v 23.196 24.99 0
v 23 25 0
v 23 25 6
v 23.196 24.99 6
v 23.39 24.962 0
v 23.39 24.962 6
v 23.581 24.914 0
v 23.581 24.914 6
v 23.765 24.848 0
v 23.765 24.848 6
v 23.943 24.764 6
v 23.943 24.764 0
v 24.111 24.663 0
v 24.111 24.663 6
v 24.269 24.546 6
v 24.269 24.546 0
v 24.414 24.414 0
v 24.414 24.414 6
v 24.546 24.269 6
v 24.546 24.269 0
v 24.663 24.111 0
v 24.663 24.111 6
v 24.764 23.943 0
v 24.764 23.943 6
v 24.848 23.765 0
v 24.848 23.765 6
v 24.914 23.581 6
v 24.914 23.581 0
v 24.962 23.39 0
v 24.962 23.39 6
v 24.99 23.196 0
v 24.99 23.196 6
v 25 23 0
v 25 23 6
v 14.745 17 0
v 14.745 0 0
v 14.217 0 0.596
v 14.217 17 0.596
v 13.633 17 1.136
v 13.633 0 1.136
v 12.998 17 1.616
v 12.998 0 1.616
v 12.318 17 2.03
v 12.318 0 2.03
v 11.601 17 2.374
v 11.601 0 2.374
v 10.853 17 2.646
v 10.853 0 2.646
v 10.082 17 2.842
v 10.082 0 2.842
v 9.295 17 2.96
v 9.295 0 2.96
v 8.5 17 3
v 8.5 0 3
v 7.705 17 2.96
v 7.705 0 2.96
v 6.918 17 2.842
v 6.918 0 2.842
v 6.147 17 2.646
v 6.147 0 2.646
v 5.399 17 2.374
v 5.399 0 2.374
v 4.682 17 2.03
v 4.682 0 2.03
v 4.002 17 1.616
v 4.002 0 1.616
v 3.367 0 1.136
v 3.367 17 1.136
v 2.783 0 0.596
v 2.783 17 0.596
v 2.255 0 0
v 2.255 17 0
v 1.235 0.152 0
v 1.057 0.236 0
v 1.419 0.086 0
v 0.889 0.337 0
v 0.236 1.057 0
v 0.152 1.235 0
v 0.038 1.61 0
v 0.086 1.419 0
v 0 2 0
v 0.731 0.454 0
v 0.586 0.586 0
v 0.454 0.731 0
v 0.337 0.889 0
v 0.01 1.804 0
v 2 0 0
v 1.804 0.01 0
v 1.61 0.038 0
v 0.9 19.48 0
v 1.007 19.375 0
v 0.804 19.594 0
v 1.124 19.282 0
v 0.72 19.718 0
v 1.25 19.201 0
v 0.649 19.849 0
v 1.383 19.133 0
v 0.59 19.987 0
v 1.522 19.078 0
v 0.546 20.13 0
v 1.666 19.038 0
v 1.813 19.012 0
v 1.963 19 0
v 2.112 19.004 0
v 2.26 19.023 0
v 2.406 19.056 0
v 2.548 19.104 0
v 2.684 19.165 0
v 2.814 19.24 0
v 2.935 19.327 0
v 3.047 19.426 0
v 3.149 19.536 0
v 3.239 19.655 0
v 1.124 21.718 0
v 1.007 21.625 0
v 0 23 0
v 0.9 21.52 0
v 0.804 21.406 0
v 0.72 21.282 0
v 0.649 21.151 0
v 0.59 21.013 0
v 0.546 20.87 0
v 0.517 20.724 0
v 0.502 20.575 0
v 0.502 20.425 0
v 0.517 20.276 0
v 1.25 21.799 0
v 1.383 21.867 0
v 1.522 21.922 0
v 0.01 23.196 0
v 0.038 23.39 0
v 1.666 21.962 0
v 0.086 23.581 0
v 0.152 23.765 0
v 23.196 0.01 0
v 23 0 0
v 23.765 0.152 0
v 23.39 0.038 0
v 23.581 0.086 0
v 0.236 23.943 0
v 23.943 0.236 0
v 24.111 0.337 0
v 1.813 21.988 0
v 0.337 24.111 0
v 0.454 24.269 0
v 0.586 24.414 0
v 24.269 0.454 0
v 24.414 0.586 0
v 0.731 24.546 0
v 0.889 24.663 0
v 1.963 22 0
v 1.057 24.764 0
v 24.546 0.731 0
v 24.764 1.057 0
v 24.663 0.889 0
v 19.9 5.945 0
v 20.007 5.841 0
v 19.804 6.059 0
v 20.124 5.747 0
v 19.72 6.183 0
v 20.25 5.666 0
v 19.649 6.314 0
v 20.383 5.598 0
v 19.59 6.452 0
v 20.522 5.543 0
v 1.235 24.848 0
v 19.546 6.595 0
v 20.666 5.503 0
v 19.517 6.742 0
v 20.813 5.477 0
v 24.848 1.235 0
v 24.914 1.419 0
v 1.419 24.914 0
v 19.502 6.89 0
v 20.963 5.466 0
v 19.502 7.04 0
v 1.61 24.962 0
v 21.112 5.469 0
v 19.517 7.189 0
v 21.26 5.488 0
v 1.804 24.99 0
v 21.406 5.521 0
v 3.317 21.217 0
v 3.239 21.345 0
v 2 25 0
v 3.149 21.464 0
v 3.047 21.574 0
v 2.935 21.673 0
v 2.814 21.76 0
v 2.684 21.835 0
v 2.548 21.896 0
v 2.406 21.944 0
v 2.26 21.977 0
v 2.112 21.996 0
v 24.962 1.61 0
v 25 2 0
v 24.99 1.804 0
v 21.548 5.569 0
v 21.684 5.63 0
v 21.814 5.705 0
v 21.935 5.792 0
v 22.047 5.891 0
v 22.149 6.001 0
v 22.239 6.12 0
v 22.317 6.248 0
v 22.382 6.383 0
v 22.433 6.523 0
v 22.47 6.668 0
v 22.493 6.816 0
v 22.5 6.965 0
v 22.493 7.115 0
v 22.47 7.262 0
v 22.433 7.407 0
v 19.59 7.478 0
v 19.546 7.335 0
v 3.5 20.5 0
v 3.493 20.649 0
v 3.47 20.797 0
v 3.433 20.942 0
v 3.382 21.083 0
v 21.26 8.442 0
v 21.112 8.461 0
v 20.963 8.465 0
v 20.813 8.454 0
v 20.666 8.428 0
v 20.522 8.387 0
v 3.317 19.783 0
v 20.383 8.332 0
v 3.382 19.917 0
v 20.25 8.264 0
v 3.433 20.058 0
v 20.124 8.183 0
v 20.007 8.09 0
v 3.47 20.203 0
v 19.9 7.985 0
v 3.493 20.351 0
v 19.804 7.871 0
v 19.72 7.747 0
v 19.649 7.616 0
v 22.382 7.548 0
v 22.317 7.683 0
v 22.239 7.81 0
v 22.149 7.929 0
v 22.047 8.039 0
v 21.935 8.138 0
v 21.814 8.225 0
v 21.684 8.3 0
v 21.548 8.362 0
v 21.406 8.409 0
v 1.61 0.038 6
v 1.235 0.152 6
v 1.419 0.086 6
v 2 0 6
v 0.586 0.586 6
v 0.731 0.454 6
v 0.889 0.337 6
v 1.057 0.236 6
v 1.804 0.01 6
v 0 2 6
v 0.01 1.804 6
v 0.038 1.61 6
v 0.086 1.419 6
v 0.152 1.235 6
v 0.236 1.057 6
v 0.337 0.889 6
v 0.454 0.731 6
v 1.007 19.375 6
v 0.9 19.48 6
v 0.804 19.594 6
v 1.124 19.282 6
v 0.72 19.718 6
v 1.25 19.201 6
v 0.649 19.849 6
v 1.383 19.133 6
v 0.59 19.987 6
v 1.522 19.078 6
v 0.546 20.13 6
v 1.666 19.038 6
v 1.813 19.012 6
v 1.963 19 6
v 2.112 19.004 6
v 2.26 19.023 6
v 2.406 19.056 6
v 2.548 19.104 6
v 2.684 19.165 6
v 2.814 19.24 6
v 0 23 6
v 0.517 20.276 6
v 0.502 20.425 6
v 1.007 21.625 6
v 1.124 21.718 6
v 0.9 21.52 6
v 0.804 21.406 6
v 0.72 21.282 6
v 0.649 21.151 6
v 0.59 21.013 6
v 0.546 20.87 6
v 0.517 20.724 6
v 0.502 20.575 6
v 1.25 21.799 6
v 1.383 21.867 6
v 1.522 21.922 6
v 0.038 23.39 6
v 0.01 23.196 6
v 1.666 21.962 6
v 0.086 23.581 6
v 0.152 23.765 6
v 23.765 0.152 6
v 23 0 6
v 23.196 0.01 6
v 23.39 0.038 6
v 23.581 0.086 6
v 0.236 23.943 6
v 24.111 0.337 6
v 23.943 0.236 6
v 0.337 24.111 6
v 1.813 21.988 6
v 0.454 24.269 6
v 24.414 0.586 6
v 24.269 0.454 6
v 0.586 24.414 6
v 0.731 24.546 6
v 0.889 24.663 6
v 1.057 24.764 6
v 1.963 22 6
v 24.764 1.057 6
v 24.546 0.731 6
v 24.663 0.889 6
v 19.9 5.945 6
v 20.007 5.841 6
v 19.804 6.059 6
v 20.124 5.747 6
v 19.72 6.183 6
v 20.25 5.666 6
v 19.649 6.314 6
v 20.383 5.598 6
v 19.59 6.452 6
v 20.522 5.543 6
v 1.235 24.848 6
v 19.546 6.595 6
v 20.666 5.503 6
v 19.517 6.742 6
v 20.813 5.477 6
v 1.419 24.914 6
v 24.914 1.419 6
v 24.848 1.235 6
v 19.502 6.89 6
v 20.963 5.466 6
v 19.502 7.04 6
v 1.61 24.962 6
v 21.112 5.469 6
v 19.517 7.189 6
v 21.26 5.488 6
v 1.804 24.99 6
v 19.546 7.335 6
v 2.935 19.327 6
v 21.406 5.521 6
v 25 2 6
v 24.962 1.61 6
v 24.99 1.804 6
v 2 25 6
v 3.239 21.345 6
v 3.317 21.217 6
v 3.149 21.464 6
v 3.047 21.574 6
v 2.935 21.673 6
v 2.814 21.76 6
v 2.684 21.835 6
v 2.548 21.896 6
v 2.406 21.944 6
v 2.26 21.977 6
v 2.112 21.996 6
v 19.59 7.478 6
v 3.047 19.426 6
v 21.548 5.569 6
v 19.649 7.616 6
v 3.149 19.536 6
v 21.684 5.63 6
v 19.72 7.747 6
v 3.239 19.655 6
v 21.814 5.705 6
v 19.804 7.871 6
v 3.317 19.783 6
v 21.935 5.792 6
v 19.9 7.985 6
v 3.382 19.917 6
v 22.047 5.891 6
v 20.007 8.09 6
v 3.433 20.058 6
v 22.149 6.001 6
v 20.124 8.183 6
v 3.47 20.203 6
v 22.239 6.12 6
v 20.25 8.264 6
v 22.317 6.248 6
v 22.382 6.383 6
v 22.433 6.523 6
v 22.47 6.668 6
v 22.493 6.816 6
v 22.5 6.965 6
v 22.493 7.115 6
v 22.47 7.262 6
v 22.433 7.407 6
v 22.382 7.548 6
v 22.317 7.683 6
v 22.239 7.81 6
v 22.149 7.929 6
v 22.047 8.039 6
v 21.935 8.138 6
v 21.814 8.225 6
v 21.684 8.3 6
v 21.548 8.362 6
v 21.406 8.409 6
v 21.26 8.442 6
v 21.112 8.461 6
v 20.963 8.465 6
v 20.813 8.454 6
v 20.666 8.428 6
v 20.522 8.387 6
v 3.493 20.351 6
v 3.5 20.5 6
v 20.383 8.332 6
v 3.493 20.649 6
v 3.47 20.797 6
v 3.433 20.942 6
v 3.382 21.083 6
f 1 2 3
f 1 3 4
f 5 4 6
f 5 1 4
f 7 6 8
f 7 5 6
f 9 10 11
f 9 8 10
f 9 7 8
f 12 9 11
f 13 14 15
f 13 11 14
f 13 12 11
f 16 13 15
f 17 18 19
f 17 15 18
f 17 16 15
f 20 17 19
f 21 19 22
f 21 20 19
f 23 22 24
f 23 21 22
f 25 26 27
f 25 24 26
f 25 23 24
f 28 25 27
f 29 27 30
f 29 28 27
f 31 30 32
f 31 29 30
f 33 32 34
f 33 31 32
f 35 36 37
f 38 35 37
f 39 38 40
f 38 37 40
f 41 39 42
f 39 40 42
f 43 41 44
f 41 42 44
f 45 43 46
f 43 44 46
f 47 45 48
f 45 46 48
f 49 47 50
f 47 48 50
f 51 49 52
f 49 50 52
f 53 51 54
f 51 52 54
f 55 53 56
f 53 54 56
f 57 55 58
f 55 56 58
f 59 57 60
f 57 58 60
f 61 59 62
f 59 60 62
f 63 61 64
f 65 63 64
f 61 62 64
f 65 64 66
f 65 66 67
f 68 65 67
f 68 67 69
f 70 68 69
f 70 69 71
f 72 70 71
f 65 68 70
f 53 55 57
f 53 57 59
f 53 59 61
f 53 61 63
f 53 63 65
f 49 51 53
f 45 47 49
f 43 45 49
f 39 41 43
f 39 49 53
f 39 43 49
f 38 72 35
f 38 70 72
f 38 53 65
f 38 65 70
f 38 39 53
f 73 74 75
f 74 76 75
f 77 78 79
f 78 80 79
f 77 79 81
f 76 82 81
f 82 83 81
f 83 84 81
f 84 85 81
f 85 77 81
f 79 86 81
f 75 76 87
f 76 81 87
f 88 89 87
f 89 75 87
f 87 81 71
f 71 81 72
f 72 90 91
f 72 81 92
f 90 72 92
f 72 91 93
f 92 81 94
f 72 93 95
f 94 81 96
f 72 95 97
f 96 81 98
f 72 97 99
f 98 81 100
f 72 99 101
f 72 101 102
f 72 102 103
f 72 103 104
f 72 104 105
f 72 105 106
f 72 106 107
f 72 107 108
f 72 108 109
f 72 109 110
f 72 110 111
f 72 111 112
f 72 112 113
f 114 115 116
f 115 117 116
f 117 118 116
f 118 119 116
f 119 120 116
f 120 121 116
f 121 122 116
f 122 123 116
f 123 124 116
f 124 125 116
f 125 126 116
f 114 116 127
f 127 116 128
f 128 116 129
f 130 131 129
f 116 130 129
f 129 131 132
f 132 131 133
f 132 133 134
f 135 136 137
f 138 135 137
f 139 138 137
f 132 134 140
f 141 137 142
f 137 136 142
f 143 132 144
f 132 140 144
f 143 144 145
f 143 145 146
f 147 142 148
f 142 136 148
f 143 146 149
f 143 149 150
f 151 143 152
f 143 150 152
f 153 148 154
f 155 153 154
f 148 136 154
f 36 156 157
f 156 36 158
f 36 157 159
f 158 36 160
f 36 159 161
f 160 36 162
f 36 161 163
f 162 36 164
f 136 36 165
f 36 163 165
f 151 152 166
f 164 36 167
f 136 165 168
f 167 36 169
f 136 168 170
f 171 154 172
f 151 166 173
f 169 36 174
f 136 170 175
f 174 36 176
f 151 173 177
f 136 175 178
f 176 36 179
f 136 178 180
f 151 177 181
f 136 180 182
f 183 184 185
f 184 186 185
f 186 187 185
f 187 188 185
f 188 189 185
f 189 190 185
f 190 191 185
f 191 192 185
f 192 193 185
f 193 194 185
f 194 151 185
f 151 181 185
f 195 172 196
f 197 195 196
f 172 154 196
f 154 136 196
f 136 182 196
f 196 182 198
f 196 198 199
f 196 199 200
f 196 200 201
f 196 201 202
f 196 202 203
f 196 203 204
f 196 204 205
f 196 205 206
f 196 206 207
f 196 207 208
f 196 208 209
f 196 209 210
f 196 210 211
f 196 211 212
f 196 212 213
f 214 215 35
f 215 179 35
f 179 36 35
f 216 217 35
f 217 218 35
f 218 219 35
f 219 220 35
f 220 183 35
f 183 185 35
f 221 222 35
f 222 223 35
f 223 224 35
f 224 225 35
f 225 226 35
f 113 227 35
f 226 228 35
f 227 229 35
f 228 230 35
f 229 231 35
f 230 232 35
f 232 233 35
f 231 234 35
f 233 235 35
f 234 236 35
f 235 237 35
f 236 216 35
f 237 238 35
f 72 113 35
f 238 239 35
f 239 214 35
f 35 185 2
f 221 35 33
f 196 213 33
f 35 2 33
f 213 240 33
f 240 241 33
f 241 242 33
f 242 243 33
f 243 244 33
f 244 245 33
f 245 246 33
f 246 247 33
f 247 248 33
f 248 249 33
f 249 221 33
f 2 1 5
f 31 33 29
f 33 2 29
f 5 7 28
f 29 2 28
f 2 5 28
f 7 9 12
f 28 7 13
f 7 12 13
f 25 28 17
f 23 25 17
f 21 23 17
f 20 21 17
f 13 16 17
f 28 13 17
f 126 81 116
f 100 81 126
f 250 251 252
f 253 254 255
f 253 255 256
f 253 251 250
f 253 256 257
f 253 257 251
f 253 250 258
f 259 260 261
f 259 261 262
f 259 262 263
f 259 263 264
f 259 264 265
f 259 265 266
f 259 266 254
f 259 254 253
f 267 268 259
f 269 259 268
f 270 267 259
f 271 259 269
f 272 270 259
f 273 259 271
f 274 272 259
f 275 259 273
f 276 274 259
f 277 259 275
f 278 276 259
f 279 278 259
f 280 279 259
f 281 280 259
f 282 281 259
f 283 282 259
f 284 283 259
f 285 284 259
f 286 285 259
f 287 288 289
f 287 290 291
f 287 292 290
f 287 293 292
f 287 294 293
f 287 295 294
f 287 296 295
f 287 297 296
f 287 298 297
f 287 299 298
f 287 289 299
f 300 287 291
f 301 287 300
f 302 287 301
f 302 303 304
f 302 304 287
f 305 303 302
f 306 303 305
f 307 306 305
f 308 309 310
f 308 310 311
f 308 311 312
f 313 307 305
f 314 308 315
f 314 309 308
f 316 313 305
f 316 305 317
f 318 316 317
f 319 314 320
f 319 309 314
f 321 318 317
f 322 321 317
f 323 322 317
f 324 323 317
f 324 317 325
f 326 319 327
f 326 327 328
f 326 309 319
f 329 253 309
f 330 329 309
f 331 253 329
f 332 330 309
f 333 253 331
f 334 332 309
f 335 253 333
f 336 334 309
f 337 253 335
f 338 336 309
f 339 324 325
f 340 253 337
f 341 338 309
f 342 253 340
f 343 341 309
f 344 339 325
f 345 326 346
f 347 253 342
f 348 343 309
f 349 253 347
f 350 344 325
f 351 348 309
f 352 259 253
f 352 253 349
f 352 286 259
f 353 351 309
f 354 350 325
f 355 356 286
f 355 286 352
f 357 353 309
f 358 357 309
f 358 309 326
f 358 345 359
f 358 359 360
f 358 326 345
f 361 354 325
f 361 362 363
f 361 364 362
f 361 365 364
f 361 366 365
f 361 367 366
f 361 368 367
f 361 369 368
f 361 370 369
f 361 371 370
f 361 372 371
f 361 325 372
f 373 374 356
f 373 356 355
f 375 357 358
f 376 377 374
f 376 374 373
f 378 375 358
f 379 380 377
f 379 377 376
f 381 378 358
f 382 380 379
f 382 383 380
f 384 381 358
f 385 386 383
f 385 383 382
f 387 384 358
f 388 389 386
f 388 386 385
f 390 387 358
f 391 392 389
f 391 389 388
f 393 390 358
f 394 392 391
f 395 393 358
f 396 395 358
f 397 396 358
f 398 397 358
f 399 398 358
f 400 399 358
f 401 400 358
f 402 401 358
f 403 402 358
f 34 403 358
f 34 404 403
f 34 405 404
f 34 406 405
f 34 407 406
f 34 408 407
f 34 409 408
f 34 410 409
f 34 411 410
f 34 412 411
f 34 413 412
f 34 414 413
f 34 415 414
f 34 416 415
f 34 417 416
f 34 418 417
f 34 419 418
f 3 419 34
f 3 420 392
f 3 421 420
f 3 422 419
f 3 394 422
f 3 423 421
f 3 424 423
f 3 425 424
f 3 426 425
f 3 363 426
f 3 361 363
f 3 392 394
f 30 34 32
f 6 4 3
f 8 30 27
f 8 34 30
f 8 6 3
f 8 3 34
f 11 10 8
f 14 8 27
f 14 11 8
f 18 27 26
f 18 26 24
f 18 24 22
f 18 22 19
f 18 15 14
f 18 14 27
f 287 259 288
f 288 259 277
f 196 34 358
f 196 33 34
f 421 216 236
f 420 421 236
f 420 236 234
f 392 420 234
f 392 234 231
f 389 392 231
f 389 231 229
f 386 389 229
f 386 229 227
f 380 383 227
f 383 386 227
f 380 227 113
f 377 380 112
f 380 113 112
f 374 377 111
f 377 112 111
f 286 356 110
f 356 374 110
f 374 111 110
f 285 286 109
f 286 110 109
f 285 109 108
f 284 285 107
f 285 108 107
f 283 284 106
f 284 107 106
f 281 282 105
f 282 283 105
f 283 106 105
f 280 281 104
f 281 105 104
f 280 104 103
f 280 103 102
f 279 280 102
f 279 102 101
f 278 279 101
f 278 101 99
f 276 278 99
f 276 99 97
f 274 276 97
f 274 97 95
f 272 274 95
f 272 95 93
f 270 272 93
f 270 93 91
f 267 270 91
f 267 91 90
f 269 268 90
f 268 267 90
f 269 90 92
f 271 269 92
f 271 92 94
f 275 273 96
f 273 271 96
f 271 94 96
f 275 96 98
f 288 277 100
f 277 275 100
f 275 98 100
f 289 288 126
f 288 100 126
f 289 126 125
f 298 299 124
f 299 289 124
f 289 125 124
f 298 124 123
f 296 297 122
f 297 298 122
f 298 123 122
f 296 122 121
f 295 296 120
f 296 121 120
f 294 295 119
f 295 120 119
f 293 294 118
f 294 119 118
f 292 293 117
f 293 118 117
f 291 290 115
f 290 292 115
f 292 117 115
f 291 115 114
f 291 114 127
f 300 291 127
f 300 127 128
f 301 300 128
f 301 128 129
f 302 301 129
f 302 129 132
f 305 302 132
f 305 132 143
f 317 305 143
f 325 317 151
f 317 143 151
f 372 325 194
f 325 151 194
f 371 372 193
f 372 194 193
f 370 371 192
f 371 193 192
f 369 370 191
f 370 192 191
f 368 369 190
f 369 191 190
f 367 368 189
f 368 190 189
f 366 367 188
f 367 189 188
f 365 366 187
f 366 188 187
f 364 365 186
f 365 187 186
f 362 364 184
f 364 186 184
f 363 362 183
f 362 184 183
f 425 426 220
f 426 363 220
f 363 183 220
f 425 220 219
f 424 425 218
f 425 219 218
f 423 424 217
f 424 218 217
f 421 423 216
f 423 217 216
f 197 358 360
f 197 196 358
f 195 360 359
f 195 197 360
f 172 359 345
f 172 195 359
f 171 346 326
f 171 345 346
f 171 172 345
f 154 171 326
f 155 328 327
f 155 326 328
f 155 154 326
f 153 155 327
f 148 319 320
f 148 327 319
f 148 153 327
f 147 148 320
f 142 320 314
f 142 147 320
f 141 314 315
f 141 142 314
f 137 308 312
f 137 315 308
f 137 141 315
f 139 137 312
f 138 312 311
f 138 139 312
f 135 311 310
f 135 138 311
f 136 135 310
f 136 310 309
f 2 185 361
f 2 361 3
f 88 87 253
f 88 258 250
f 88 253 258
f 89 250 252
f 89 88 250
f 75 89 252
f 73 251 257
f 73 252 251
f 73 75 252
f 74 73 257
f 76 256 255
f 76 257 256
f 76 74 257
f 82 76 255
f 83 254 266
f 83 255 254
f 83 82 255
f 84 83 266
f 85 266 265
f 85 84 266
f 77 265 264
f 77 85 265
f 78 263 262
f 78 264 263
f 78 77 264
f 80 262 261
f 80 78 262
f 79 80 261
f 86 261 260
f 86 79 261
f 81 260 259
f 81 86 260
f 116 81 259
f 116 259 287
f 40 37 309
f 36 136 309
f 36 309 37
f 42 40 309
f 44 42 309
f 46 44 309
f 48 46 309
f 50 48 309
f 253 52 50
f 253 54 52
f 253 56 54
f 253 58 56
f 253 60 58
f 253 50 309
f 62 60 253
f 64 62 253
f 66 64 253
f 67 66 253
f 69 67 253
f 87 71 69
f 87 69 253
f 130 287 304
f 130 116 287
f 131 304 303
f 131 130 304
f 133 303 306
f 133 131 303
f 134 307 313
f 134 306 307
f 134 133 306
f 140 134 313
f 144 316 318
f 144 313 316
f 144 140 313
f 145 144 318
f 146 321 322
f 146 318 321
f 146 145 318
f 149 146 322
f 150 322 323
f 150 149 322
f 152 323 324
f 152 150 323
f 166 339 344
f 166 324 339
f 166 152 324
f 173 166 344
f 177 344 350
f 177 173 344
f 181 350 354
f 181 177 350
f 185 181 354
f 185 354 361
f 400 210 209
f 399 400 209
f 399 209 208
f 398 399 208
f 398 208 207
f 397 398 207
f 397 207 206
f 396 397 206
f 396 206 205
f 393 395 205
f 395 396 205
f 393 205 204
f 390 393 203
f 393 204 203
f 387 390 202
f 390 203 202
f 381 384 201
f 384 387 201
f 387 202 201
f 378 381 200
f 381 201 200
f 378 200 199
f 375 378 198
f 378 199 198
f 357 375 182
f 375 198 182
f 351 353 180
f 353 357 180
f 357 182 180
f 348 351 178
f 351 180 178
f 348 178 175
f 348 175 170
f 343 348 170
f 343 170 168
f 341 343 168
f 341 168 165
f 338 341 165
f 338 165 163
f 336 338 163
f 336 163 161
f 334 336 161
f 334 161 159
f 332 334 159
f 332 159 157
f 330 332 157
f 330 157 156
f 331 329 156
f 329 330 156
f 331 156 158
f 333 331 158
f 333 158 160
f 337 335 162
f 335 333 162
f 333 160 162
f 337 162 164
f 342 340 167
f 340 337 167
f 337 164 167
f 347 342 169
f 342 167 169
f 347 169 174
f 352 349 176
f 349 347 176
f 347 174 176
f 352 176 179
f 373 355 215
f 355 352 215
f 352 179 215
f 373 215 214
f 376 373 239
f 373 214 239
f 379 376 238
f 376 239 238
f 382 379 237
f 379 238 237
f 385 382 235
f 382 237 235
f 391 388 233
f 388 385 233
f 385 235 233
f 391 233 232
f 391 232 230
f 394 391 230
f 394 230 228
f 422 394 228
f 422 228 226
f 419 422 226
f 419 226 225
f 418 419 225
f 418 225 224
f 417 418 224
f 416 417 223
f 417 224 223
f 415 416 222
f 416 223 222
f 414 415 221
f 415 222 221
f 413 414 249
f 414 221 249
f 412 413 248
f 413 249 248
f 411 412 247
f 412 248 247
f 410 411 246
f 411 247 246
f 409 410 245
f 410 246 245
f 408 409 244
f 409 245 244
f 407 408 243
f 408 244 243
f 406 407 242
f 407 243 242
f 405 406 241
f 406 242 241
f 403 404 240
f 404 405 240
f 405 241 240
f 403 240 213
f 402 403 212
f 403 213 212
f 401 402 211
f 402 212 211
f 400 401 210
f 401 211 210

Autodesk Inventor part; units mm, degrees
ref_plane "YZ Plane" through (0, 0, 0) normal (1, 0, 0) x (0, 1, 0)
ref_plane "XZ Plane" through (0, 0, 0) normal (0, 1, 0) x (-1, 0, 0)
ref_plane "XY Plane" through (0, 0, 0) normal (0, 0, 1) x (1, 0, 0)
sketch "Sketch1" plane through (0, 0, 0) normal (0, 0, 1) x (1, 0, 0)
  circle A0 centre (21, 6.9652) radius 1.5 construction
  circle A1 centre (21, 6.9652) radius 1.5 construction
  line L0 (25, 0) -> (16.5, 0) construction
  line L1 (25, 0) -> (25, 55) construction
  line L2 (0, 55) -> (25, 55) construction
  line L3 (0, 0) -> (0, 55) construction
  line L4 (0.5, 0) -> (0, 0) construction
  line L5 (0.5, 17) -> (16.5, 17) construction
  circle A2 centre (16, 45) radius 7.5 construction
  line L6 (2, 25) -> (23, 25)
  line L7 (25, 23) -> (25, 2)
  line L8 (23, 0) -> (2, 0)
  line L9 (0, 2) -> (0, 23)
  circle A3 centre (21, 6.9652) radius 1.5
  arc A4 (2, 25) -> (0, 23) centre (2, 23) ccw
  arc A5 (0, 2) -> (2, 0) centre (2, 2) ccw
  arc A6 (23, 0) -> (25, 2) centre (23, 2) ccw
  arc A7 (25, 23) -> (23, 25) centre (23, 23) ccw
  circle A8 centre (2, 20.5) radius 1.5
  circle A9 centre (2, 20.5) radius 1.5 projected
  line L10 (14.5, 12) -> (14.5, 6) projected
  line L11 (14.5, 6) -> (16.5, 6) projected
  line L12 (16.5, 6) -> (16.5, 0) projected
  line L13 (0.5, 0) -> (0.5, 6) projected
  line L14 (0.5, 6) -> (2.5, 6) projected
  line L15 (2.5, 6) -> (2.5, 12) projected
  line L16 (2.5, 12) -> (0.5, 12) projected
  line L17 (0.5, 12) -> (0.5, 17) projected
  line L18 (16.5, 17) -> (16.5, 12) projected
  line L19 (16.5, 12) -> (14.5, 12) projected
  point P0 (0, 25)
  dimension "d0" = 25
  dimension "d1" = 3
  dimension "d2" = 2
  dimension "d5" = 3
  dimension "d6" = 2
  dimension "d7" = 4.5
extrude "Extrusion1" add sketch "Sketch1" along normal blind 6
sketch "Sketch2" plane through (2, 0, 0) normal (0, -1, 0) x (1, 0, 0)
  circle A0 centre (6.5, -5) radius 8 construction
  circle A1 centre (6.5, -5) radius 8
  line L0 (21, 0) -> (0, 0) projected
  line L1 (0, 0) -> (0, 6) projected
  line L2 (21, 6) -> (0, 6) projected
  line L3 (21, 0) -> (21, 6) projected
  line L4 (12.745, 0) -> (0.255, 0)
  point P0 (-2, 0)
extrude "Extrusion2" cut sketch "Sketch2" against normal blind 17 contours L0 A1 picked at (4.8404, 0.4206)
properties part number "Hotend Lock 3"
